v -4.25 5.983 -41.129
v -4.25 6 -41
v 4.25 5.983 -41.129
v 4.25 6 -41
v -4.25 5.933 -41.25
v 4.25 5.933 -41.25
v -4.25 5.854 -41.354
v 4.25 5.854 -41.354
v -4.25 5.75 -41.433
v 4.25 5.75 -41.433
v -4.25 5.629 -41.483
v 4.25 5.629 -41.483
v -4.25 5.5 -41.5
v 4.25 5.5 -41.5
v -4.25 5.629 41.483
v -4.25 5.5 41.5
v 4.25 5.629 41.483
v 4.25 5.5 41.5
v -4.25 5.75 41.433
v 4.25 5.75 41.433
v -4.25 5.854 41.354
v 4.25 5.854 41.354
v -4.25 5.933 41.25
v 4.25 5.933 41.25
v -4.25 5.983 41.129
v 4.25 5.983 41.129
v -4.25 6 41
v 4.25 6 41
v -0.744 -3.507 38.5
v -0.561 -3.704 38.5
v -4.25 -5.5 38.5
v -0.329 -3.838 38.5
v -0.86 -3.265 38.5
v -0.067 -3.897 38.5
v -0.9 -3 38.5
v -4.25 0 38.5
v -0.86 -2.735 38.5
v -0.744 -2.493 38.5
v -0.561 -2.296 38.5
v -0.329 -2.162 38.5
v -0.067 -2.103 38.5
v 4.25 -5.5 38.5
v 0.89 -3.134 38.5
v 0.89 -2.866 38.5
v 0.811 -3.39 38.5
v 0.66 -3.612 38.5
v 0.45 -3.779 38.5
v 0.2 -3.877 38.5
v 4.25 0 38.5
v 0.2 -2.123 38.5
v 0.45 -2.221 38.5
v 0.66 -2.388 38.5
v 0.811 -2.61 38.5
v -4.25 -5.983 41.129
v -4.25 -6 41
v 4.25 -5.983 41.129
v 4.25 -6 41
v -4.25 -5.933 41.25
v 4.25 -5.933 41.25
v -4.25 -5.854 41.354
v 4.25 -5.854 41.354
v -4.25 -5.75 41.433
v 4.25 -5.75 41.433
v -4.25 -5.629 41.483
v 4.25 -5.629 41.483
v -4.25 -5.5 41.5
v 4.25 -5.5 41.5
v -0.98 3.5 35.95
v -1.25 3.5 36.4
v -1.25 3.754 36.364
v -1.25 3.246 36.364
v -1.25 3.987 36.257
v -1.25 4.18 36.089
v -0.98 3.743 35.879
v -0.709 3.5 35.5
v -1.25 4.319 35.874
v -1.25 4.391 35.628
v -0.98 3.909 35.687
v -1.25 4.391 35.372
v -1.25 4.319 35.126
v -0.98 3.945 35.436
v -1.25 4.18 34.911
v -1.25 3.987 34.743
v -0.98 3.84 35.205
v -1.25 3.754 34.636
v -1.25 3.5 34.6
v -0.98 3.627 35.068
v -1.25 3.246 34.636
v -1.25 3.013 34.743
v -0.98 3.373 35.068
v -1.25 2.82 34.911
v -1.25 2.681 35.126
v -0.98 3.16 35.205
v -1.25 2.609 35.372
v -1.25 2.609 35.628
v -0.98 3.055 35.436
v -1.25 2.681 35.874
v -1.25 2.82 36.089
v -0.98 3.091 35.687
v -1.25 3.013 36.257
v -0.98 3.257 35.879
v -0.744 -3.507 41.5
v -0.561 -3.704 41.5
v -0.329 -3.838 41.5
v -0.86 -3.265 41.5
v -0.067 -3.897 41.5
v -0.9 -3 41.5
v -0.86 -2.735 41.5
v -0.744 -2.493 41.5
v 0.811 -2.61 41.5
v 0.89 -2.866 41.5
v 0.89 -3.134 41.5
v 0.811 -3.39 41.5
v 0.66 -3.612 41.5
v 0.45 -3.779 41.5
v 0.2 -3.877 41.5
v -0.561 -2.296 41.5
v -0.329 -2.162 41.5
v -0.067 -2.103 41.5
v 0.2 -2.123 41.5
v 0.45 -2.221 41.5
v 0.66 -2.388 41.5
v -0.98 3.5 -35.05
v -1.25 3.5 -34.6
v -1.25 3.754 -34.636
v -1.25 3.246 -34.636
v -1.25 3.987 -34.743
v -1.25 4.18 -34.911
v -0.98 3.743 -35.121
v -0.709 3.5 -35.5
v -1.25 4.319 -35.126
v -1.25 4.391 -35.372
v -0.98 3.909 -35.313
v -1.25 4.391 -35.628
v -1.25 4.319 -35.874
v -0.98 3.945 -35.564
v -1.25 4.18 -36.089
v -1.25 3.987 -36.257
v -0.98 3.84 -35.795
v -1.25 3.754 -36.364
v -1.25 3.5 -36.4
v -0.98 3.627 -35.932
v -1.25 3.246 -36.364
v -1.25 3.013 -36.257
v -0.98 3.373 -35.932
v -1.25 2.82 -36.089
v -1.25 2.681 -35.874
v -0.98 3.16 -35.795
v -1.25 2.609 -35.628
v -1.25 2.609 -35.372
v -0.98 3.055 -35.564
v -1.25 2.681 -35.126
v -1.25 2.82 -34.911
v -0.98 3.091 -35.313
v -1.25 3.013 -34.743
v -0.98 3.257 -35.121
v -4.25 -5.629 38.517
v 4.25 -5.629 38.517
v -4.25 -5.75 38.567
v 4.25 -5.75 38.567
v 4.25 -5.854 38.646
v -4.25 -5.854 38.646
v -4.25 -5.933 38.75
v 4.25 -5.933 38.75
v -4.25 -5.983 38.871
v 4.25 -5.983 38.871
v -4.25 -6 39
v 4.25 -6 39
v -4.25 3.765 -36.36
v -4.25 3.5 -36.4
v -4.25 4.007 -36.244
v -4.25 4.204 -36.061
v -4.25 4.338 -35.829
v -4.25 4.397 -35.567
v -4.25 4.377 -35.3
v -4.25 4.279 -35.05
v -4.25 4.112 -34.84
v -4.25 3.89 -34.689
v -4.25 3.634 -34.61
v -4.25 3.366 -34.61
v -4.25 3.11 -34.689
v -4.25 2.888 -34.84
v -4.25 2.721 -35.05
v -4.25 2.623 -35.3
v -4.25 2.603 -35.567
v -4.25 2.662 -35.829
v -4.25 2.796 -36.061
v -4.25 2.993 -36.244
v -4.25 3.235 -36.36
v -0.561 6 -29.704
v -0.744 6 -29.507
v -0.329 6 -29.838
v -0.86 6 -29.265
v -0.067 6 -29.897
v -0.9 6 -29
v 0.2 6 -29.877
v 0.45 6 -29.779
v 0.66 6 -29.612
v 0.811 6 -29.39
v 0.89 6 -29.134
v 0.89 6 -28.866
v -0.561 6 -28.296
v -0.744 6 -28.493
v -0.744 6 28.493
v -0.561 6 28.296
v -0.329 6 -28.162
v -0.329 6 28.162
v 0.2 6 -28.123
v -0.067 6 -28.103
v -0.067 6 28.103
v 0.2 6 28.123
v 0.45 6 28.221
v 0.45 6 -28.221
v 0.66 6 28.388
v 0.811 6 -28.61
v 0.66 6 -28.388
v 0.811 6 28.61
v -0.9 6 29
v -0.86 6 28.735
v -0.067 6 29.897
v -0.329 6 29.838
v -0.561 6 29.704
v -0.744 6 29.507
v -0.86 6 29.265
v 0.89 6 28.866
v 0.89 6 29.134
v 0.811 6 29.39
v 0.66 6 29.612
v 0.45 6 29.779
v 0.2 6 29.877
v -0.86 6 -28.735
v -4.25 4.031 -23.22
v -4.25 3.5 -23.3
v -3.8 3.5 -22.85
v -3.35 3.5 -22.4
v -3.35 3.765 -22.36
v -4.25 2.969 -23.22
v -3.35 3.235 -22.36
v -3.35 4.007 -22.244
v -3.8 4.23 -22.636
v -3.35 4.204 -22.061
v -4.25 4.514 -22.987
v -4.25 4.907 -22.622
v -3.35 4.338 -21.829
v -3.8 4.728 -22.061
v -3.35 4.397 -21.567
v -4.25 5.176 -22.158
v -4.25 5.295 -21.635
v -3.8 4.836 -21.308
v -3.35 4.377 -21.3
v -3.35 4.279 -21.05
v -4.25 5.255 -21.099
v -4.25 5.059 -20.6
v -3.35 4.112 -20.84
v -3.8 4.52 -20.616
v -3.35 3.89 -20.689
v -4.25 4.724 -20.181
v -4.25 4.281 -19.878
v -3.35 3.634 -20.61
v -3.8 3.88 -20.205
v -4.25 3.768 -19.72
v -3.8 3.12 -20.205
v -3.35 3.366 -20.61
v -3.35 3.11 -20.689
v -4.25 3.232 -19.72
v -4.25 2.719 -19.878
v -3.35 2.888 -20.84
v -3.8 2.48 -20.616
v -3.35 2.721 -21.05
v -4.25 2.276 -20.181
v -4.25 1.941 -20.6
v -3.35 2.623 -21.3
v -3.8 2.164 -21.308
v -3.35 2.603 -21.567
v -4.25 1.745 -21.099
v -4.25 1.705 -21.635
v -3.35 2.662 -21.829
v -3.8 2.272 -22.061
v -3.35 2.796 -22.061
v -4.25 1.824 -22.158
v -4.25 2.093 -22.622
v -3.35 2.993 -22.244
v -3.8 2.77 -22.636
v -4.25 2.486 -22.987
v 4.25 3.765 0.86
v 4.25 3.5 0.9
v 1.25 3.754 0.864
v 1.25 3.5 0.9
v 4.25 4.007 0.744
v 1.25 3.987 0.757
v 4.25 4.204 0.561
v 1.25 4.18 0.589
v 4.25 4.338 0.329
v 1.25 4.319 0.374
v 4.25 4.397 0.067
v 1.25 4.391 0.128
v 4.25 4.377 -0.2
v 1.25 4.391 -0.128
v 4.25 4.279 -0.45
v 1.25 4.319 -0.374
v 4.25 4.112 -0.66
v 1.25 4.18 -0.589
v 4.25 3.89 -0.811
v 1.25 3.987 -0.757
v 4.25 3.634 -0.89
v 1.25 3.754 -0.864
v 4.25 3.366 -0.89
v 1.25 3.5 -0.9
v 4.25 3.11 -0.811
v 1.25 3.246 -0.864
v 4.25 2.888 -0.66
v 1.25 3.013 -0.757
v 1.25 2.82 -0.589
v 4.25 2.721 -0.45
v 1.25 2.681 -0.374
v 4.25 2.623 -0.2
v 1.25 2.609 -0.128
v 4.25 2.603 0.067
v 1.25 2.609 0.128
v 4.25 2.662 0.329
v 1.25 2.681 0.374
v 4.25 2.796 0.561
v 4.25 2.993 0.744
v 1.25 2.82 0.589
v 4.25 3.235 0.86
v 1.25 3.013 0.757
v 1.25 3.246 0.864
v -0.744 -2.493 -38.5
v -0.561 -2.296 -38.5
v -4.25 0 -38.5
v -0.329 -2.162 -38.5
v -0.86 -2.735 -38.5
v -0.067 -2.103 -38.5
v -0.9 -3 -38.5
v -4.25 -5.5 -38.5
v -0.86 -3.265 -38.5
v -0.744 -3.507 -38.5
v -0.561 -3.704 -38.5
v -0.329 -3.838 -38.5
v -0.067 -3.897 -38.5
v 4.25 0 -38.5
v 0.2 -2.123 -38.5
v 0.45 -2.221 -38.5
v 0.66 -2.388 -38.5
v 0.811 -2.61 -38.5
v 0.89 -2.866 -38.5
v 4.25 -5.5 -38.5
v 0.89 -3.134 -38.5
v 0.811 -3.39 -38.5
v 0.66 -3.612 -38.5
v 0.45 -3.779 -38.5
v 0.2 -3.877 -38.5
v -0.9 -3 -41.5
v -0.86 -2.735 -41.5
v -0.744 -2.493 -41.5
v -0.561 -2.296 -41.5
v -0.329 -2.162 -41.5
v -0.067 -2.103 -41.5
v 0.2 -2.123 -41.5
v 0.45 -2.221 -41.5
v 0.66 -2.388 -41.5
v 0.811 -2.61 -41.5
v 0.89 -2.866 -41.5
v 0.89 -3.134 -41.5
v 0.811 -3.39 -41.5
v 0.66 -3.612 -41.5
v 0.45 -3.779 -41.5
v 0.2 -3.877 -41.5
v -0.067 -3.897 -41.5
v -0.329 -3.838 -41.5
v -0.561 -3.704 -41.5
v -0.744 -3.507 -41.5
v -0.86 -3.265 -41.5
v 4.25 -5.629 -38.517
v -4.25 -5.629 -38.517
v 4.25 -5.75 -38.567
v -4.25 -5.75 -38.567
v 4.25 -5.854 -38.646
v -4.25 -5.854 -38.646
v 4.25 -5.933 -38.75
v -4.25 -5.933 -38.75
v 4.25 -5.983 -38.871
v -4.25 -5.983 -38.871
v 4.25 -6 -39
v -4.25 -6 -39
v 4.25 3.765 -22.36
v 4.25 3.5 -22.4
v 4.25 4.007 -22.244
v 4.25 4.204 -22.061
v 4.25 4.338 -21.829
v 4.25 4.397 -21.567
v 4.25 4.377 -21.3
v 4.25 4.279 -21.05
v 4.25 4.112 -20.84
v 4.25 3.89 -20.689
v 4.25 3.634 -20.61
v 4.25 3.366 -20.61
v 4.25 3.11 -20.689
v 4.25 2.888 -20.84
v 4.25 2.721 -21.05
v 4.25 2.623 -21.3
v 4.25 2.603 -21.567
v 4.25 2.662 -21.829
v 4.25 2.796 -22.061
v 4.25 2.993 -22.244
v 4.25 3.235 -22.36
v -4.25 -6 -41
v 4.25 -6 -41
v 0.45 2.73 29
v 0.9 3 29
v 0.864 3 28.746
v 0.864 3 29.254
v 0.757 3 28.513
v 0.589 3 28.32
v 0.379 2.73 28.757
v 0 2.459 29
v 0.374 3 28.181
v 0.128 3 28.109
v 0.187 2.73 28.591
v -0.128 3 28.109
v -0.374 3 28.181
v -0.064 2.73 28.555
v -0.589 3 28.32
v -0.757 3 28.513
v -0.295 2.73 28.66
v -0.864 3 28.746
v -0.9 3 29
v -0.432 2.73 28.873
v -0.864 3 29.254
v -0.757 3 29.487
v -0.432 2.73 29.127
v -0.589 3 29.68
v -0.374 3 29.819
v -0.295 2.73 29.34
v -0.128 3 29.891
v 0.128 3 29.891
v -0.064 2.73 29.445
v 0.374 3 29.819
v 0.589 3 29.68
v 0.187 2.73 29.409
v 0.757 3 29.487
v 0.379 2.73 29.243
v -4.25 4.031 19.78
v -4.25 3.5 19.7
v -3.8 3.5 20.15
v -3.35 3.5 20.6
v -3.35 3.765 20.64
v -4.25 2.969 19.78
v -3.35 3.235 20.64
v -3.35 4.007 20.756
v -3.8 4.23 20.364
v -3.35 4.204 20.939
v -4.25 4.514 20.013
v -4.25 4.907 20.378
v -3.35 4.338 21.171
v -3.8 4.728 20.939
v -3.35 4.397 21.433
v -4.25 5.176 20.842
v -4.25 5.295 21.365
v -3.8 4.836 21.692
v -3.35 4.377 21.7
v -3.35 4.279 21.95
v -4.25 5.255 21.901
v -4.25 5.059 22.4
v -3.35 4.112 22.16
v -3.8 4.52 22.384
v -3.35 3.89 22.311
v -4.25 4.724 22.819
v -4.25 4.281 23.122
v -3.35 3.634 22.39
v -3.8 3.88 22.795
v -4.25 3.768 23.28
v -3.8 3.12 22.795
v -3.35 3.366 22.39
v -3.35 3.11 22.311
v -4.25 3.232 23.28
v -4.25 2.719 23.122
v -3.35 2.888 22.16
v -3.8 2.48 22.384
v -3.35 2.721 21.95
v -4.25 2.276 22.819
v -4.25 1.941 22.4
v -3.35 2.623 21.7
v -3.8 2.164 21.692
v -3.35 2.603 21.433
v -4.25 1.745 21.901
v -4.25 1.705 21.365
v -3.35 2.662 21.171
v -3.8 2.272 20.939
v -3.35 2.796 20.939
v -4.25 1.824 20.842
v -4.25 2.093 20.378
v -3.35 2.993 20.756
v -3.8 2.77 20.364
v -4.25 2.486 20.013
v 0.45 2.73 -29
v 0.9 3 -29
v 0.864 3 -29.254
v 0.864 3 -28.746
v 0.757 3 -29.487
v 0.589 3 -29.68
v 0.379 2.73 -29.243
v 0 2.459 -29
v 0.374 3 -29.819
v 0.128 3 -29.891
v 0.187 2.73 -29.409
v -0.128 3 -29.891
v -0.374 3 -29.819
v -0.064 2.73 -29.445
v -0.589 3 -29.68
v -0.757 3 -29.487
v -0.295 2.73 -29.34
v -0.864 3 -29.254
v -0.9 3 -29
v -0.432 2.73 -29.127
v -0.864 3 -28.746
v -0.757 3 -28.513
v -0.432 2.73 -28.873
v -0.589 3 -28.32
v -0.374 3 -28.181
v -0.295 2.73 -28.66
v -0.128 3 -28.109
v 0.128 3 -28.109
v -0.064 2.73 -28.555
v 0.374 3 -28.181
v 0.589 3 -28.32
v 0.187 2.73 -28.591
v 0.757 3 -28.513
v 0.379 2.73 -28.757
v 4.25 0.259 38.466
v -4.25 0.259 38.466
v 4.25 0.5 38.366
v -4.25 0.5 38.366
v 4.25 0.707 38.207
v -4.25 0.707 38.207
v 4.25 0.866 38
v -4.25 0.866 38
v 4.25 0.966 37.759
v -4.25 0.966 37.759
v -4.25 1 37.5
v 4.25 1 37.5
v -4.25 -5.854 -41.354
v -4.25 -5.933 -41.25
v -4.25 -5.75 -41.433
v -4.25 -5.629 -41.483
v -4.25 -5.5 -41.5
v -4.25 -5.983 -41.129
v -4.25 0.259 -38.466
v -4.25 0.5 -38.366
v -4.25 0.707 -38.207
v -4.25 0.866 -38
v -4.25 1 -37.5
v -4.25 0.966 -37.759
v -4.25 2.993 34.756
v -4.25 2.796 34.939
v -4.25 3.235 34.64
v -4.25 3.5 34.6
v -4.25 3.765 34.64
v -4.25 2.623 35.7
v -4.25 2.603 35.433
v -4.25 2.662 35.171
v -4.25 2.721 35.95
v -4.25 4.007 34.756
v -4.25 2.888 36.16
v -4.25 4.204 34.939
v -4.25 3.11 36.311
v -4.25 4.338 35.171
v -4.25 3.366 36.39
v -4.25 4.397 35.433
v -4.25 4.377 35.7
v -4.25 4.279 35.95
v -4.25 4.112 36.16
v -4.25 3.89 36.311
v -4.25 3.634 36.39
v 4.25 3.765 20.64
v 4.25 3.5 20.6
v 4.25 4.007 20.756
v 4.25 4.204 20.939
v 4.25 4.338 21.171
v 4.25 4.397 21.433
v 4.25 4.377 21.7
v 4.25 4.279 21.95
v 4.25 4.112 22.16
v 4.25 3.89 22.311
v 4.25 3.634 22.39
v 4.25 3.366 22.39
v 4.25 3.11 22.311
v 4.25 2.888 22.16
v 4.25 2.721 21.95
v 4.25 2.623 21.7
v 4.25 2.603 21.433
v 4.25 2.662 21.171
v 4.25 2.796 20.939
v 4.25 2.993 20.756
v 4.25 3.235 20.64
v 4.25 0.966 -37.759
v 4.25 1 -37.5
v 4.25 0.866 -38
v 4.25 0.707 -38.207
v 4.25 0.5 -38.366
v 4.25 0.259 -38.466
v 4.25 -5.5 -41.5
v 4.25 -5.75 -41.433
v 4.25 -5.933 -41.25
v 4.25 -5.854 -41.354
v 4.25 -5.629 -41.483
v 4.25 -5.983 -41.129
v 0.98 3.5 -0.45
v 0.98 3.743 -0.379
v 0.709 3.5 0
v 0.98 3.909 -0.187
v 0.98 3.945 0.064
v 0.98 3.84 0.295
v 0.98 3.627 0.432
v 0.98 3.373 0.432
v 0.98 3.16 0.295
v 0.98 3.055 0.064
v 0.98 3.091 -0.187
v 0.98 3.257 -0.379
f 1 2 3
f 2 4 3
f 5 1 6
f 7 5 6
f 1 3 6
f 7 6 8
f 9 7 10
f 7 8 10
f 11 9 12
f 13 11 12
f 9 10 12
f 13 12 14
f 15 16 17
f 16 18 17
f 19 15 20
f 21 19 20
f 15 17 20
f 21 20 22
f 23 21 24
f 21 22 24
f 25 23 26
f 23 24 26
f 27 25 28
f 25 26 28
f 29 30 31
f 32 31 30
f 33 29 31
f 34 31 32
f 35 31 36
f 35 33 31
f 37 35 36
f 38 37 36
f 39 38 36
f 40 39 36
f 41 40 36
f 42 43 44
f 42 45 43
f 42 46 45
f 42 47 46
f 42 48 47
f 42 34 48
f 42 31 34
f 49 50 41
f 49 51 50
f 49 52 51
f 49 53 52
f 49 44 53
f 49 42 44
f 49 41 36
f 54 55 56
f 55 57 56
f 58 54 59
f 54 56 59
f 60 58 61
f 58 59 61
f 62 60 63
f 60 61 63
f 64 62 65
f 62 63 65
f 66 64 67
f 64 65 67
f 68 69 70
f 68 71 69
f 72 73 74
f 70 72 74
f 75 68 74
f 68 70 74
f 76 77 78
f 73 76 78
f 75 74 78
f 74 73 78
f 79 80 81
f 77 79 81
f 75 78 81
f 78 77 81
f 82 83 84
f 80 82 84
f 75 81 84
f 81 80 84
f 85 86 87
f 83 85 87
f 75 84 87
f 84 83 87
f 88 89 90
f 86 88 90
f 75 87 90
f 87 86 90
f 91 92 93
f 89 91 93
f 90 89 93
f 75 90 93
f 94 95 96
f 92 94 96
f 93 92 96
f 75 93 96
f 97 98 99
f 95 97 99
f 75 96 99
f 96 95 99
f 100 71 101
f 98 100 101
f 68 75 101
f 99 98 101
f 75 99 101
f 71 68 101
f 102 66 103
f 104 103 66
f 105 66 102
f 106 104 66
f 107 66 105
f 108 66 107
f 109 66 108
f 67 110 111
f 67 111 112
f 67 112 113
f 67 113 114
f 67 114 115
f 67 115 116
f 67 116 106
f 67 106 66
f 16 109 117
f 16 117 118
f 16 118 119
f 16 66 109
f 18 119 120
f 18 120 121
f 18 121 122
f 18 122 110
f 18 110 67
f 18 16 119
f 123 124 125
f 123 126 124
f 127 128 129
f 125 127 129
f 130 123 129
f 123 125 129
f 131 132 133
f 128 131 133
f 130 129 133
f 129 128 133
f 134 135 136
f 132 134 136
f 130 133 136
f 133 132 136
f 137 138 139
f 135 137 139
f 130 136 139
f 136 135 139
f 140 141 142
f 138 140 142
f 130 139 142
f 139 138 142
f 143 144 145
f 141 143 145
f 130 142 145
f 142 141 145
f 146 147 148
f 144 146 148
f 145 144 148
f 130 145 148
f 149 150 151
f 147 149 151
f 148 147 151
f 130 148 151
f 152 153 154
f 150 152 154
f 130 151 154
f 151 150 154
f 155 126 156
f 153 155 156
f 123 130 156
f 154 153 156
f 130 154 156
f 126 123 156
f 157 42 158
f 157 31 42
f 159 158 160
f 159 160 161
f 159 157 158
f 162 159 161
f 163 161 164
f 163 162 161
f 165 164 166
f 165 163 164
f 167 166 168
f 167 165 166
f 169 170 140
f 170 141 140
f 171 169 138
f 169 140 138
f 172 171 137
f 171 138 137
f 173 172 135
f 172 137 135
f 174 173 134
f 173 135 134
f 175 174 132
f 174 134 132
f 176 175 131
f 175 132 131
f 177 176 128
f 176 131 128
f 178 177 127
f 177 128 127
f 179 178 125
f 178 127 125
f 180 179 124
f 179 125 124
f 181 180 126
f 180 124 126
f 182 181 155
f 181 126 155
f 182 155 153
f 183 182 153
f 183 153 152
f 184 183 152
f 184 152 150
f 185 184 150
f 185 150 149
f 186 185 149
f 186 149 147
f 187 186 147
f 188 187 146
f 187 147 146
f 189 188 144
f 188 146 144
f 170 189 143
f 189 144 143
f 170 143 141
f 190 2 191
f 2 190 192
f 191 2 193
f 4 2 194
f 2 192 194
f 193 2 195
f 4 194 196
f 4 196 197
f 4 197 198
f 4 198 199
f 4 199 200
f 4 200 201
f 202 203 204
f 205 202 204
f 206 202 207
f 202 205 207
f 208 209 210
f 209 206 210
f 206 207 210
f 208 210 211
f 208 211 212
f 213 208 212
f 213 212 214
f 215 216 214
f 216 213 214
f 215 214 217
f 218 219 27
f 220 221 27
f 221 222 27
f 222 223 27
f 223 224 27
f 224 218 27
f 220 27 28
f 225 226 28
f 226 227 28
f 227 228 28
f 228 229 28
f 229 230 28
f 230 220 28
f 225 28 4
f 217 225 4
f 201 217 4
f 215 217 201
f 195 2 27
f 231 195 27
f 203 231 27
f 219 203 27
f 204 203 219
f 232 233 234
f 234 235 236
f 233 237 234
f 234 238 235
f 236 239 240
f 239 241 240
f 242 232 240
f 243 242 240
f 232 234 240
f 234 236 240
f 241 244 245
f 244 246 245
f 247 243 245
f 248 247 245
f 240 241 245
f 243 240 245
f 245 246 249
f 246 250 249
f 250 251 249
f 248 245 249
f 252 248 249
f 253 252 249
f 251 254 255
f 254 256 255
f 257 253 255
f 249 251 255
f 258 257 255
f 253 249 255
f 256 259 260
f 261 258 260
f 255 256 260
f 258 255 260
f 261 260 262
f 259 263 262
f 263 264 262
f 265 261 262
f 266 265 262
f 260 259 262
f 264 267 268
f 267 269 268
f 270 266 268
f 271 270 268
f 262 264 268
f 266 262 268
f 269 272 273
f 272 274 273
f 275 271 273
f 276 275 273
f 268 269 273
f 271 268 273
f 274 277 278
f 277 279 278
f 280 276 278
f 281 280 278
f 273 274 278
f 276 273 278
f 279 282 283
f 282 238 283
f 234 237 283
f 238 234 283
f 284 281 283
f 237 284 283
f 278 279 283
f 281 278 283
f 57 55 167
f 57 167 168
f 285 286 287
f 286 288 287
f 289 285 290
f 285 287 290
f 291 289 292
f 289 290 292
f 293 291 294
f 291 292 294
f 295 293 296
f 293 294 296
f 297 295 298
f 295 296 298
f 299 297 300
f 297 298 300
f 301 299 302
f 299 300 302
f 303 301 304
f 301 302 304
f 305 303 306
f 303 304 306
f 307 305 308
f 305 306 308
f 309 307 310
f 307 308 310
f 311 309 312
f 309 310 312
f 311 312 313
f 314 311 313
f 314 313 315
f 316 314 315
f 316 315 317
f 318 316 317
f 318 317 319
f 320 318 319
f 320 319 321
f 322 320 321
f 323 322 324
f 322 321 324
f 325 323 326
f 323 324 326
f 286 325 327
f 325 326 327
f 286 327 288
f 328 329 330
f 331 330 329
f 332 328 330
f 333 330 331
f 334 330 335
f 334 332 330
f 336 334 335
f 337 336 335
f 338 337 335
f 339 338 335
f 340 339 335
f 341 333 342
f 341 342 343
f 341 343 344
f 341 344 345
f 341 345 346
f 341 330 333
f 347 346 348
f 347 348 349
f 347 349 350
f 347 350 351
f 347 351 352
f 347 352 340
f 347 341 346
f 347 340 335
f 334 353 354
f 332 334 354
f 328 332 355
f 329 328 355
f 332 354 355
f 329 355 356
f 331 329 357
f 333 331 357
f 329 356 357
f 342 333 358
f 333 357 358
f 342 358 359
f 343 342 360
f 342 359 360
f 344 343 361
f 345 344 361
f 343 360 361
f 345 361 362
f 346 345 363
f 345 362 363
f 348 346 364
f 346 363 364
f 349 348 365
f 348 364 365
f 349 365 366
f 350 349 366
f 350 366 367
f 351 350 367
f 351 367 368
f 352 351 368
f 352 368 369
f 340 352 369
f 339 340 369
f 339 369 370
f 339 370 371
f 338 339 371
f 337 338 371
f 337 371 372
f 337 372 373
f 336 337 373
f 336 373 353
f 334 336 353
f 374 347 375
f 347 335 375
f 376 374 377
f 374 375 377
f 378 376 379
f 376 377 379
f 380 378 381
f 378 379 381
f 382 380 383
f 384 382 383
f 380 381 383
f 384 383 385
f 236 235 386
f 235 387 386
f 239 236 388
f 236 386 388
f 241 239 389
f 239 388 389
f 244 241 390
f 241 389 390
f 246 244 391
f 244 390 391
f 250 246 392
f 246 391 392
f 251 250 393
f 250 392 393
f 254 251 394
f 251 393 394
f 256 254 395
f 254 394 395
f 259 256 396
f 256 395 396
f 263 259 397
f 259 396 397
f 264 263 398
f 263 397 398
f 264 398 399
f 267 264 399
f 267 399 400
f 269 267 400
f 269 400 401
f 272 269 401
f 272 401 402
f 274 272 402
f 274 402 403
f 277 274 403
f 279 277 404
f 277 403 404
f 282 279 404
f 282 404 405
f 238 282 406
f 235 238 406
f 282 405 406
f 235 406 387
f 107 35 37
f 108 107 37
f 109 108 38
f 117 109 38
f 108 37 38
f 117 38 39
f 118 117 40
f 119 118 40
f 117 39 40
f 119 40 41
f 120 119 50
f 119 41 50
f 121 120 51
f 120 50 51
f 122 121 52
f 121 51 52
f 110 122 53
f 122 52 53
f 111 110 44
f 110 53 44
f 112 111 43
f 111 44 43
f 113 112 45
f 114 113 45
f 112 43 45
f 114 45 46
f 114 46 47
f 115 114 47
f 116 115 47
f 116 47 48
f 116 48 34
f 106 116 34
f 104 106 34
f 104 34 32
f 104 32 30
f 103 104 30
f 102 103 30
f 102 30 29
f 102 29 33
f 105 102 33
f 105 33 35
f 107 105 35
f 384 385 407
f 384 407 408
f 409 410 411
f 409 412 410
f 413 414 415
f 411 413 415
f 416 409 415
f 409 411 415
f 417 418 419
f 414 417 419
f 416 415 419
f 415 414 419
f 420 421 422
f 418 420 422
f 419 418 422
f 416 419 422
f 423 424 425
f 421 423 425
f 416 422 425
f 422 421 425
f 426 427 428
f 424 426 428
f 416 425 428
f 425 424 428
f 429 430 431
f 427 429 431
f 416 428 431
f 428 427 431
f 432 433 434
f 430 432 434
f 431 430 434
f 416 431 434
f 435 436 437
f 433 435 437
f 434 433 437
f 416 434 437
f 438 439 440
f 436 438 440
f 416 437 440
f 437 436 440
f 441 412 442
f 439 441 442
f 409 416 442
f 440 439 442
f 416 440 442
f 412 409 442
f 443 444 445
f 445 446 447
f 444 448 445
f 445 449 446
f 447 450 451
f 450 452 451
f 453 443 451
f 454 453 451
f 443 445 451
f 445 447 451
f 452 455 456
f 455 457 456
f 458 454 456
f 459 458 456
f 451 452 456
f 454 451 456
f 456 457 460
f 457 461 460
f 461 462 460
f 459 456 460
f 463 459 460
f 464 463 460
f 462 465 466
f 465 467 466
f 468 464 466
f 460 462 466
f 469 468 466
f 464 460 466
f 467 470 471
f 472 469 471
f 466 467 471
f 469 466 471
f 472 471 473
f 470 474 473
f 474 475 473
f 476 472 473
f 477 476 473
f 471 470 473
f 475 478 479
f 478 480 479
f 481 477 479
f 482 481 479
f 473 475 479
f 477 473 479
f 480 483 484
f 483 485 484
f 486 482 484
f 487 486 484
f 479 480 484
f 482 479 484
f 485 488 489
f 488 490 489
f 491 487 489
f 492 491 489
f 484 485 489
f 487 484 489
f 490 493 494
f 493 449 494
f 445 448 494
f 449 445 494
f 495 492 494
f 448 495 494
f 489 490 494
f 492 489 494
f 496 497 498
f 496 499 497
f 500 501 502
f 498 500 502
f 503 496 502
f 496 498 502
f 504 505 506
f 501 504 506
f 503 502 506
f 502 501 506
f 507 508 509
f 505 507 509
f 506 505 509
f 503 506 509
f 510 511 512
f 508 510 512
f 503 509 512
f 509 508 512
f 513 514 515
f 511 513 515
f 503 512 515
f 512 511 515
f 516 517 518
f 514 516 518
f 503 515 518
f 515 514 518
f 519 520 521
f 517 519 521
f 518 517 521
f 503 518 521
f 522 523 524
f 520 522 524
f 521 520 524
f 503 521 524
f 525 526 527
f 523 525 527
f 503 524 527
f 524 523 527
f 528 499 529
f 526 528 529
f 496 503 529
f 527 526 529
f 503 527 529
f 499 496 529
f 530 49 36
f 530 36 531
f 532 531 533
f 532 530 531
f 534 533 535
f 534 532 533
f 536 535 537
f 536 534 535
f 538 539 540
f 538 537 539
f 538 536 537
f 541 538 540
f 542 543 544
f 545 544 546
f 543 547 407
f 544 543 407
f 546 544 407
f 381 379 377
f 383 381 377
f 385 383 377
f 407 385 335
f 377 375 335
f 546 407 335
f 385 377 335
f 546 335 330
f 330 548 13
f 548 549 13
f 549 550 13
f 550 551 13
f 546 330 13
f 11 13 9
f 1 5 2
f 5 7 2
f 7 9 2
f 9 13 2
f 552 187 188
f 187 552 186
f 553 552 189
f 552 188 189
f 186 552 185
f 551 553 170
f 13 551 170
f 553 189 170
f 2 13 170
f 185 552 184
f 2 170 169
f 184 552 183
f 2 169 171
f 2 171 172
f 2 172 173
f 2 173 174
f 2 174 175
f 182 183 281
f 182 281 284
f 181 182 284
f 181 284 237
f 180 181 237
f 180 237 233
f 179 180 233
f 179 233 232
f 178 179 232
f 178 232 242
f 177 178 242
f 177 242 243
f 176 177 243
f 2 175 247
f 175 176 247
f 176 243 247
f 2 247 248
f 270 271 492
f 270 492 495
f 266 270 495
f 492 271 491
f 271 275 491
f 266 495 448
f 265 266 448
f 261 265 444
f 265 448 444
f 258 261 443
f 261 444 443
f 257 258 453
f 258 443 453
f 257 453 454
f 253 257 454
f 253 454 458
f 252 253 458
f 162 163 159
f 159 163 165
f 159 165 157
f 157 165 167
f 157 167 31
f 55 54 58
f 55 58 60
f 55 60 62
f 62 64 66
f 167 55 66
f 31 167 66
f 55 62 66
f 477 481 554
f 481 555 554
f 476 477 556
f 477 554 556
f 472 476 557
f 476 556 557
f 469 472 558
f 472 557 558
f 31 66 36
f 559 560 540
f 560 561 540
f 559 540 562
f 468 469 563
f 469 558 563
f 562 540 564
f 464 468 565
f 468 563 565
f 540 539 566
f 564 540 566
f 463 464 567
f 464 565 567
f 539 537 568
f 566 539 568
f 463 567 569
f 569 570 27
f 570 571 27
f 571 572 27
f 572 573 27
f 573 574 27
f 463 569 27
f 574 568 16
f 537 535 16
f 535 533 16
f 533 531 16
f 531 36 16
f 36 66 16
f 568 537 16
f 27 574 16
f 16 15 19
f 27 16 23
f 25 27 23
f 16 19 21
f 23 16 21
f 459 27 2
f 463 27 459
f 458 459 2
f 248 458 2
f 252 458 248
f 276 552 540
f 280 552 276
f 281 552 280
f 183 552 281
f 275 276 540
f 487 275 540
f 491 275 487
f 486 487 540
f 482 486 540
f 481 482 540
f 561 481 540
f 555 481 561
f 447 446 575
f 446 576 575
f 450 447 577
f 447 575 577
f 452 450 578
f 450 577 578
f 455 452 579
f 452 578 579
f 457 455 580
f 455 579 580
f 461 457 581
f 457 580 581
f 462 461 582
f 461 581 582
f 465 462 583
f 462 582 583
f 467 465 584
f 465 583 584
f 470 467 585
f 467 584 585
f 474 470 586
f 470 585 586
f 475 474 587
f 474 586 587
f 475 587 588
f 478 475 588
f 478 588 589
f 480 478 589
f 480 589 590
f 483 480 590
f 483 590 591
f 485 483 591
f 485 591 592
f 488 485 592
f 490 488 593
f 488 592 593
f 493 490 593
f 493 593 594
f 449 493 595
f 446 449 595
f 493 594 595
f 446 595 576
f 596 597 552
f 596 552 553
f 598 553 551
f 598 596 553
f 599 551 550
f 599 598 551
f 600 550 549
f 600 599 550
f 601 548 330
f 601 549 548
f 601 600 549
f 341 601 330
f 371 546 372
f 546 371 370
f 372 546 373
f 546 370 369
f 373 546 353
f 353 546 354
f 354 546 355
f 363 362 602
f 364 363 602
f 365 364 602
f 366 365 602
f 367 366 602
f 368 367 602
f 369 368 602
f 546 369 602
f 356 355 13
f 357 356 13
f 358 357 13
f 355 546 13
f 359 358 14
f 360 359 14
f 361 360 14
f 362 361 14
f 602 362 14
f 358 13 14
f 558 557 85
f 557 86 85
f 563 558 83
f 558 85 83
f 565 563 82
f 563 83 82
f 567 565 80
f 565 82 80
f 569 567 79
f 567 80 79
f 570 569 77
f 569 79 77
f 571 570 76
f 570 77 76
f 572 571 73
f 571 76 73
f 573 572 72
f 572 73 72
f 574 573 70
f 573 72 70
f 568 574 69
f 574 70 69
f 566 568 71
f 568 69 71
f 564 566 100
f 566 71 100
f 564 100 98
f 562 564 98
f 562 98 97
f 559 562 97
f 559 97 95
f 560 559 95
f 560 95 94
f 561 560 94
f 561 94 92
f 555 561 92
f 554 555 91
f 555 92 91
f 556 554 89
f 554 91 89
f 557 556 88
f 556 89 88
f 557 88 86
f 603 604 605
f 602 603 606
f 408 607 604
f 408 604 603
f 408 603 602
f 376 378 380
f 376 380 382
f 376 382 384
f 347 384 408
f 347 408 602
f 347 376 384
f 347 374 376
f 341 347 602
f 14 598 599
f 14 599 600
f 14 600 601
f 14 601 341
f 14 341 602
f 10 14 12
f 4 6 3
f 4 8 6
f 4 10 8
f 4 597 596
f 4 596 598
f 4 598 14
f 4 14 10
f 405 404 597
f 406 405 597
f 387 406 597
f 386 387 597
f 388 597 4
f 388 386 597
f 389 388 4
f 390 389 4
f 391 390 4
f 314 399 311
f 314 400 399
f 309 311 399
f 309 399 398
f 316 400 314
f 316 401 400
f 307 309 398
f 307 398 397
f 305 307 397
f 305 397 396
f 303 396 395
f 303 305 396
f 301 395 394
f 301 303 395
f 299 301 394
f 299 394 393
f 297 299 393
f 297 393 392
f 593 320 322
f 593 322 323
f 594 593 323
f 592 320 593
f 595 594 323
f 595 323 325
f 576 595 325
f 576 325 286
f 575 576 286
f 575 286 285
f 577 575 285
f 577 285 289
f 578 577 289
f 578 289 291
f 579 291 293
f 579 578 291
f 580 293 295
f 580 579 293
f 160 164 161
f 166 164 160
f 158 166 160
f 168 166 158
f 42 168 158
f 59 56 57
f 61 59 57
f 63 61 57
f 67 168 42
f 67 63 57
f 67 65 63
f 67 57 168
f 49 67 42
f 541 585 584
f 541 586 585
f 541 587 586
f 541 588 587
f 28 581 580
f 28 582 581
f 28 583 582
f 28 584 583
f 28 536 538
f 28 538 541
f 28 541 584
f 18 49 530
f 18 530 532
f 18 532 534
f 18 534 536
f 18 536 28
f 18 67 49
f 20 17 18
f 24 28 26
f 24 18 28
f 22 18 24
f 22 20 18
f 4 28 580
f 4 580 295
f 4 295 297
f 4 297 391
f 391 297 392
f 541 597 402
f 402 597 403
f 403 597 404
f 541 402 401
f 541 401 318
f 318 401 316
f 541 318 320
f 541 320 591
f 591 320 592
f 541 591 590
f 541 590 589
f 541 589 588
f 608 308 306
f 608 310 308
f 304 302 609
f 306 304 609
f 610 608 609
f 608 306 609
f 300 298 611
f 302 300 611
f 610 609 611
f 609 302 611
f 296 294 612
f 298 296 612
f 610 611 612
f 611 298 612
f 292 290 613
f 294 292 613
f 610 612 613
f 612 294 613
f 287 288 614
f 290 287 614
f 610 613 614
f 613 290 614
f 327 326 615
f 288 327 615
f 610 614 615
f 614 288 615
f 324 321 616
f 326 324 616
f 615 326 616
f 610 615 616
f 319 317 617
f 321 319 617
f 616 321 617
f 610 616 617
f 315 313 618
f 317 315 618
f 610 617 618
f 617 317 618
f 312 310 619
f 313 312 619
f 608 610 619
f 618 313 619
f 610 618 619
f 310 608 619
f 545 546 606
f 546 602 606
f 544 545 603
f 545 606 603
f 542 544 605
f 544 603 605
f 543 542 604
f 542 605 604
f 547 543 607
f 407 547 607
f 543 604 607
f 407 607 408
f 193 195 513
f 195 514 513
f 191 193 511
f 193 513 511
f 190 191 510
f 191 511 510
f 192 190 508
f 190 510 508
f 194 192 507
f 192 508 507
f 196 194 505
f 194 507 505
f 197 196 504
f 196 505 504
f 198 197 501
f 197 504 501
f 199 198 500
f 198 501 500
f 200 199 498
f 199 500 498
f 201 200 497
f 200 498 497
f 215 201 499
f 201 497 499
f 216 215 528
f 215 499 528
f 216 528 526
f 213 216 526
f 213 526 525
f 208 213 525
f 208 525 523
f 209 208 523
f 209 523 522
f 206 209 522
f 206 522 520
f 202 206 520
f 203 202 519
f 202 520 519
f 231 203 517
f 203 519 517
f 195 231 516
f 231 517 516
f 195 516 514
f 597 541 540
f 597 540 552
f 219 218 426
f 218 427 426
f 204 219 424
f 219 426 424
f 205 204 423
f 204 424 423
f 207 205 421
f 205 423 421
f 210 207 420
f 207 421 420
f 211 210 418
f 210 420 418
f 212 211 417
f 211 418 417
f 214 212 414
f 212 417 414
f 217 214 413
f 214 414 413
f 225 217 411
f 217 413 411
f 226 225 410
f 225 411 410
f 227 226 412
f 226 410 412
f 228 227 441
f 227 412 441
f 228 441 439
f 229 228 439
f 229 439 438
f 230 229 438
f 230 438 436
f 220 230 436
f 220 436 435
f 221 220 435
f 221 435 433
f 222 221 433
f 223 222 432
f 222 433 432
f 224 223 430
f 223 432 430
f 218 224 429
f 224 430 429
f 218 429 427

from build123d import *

# Parameters (mm, degrees)
SKETCH1_W                        = 8.5
SKETCH1_H                        = 12
BOSS_EXTRUDE1_DEPTH              = 41.5
CUT_EXTRUDE1_DEPTH               = 43.784342931
M1_6_HOLE1_FIXINGPCB_D           = 1.8
M1_6_HOLE1_FIXINGPCB_CSINK_D     = 3.6
M1_6_HOLE1_FIXINGPCB_CSINK_ANGLE = 90
FILLET1_R                        = 0.5
M1_6_HOLE2_INTUNION_D            = 1.8
M1_6_HOLE2_INTUNION_DEPTH        = 200
M1_6_HOLE2_INTUNION_TIP          = 0.540774557
M1_6_HOLE3_EXTUNION_D            = 1.8
M1_6_HOLE3_EXTUNION_DEPTH        = 3
M1_6_HOLE3_EXTUNION_TIP          = 0.540774557
M1_6_HOLE4_TOPUNION_D            = 1.8
M1_6_HOLE4_TOPUNION_DEPTH        = 3
M1_6_HOLE4_TOPUNION_TIP          = 0.540774557
M1_6_CLEARANCE_HOLE1_D           = 1.8
M1_6_CLEARANCE_HOLE1_DEPTH       = 3
M1_6_CLEARANCE_HOLE1_TIP         = 0.540774557


with BuildPart() as part:
    # Sketch1 → Boss-Extrude1 (new, symmetric)
    with BuildSketch(Plane.XY):
        Rectangle(SKETCH1_W, SKETCH1_H)
    extrude(amount=BOSS_EXTRUDE1_DEPTH, both=True)

    # Sketch2 → Cut-Extrude1 (cut, through all)
    with BuildSketch(Plane(origin=(4.25, 0, 0), x_dir=(0, 0, -1), z_dir=(1, 0, 0))):
        with BuildLine():
            Line((-37.5, 1), (37.5, 1))
            ThreePointArc((37.5, 1), (38.207106781, 0.707106781), (38.5, 0))
            Line((38.5, 0), (38.5, -6))
            Line((38.5, -6), (-38.5, -6))
            Line((-38.5, -6), (-38.5, 0))
            ThreePointArc((-38.5, 0), (-38.207106781, 0.707106781), (-37.5, 1))
        make_face()
    extrude(amount=-CUT_EXTRUDE1_DEPTH, mode=Mode.SUBTRACT)

    # M1.6 Hole1-FixingPCB (through all)
    with Locations(Plane.ZY.offset(4.25)):
        with Locations((-21.5, 3.5), (21.5, 3.5)):
            CounterSinkHole(M1_6_HOLE1_FIXINGPCB_D / 2, M1_6_HOLE1_FIXINGPCB_CSINK_D / 2, counter_sink_angle=M1_6_HOLE1_FIXINGPCB_CSINK_ANGLE)

    # Fillet1
    fillet1_edges = [part.edges().sort_by_distance(p)[0] for p in [
        (0, -6, 41.5),
        (0, -6, -38.5),
        (0, -6, 38.5),
        (0, -6, -41.5),
        (0, 6, -41.5),
        (0, 6, 41.5),
    ]]
    fillet(fillet1_edges, radius=FILLET1_R)

    # M1.6 Hole2-IntUnion
    with Locations(Plane.XY.offset(41.5)):
        with Locations((0, -3)):
            Hole(M1_6_HOLE2_INTUNION_D / 2, depth=M1_6_HOLE2_INTUNION_DEPTH)
            with Locations((0, 0, -(M1_6_HOLE2_INTUNION_DEPTH + M1_6_HOLE2_INTUNION_TIP / 2))):  # 118° drill point
                Cone(0, M1_6_HOLE2_INTUNION_D / 2, M1_6_HOLE2_INTUNION_TIP, mode=Mode.SUBTRACT)

    # M1.6 Hole3-ExtUnion
    with Locations(Plane.ZY.offset(4.25)):
        with Locations((-35.5, 3.5), (35.5, 3.5)):
            Hole(M1_6_HOLE3_EXTUNION_D / 2, depth=M1_6_HOLE3_EXTUNION_DEPTH)
            with Locations((0, 0, -(M1_6_HOLE3_EXTUNION_DEPTH + M1_6_HOLE3_EXTUNION_TIP / 2))):  # 118° drill point
                Cone(0, M1_6_HOLE3_EXTUNION_D / 2, M1_6_HOLE3_EXTUNION_TIP, mode=Mode.SUBTRACT)

    # M1.6 Hole4-TopUnion
    with Locations(Plane(origin=(4.25, 0, 0), x_dir=(0, 0, -1), z_dir=(1, 0, 0))):
        with Locations((0, 3.5)):
            Hole(M1_6_HOLE4_TOPUNION_D / 2, depth=M1_6_HOLE4_TOPUNION_DEPTH)
            with Locations((0, 0, -(M1_6_HOLE4_TOPUNION_DEPTH + M1_6_HOLE4_TOPUNION_TIP / 2))):  # 118° drill point
                Cone(0, M1_6_HOLE4_TOPUNION_D / 2, M1_6_HOLE4_TOPUNION_TIP, mode=Mode.SUBTRACT)

    # M1.6 Clearance Hole1
    with Locations(Plane(origin=(0, 6, 0), x_dir=(1, 0, 0), z_dir=(0, 1, 0))):
        with Locations((0, 29), (0, -29)):
            Hole(M1_6_CLEARANCE_HOLE1_D / 2, depth=M1_6_CLEARANCE_HOLE1_DEPTH)
            with Locations((0, 0, -(M1_6_CLEARANCE_HOLE1_DEPTH + M1_6_CLEARANCE_HOLE1_TIP / 2))):  # 118° drill point
                Cone(0, M1_6_CLEARANCE_HOLE1_D / 2, M1_6_CLEARANCE_HOLE1_TIP, mode=Mode.SUBTRACT)


solid = part.part
